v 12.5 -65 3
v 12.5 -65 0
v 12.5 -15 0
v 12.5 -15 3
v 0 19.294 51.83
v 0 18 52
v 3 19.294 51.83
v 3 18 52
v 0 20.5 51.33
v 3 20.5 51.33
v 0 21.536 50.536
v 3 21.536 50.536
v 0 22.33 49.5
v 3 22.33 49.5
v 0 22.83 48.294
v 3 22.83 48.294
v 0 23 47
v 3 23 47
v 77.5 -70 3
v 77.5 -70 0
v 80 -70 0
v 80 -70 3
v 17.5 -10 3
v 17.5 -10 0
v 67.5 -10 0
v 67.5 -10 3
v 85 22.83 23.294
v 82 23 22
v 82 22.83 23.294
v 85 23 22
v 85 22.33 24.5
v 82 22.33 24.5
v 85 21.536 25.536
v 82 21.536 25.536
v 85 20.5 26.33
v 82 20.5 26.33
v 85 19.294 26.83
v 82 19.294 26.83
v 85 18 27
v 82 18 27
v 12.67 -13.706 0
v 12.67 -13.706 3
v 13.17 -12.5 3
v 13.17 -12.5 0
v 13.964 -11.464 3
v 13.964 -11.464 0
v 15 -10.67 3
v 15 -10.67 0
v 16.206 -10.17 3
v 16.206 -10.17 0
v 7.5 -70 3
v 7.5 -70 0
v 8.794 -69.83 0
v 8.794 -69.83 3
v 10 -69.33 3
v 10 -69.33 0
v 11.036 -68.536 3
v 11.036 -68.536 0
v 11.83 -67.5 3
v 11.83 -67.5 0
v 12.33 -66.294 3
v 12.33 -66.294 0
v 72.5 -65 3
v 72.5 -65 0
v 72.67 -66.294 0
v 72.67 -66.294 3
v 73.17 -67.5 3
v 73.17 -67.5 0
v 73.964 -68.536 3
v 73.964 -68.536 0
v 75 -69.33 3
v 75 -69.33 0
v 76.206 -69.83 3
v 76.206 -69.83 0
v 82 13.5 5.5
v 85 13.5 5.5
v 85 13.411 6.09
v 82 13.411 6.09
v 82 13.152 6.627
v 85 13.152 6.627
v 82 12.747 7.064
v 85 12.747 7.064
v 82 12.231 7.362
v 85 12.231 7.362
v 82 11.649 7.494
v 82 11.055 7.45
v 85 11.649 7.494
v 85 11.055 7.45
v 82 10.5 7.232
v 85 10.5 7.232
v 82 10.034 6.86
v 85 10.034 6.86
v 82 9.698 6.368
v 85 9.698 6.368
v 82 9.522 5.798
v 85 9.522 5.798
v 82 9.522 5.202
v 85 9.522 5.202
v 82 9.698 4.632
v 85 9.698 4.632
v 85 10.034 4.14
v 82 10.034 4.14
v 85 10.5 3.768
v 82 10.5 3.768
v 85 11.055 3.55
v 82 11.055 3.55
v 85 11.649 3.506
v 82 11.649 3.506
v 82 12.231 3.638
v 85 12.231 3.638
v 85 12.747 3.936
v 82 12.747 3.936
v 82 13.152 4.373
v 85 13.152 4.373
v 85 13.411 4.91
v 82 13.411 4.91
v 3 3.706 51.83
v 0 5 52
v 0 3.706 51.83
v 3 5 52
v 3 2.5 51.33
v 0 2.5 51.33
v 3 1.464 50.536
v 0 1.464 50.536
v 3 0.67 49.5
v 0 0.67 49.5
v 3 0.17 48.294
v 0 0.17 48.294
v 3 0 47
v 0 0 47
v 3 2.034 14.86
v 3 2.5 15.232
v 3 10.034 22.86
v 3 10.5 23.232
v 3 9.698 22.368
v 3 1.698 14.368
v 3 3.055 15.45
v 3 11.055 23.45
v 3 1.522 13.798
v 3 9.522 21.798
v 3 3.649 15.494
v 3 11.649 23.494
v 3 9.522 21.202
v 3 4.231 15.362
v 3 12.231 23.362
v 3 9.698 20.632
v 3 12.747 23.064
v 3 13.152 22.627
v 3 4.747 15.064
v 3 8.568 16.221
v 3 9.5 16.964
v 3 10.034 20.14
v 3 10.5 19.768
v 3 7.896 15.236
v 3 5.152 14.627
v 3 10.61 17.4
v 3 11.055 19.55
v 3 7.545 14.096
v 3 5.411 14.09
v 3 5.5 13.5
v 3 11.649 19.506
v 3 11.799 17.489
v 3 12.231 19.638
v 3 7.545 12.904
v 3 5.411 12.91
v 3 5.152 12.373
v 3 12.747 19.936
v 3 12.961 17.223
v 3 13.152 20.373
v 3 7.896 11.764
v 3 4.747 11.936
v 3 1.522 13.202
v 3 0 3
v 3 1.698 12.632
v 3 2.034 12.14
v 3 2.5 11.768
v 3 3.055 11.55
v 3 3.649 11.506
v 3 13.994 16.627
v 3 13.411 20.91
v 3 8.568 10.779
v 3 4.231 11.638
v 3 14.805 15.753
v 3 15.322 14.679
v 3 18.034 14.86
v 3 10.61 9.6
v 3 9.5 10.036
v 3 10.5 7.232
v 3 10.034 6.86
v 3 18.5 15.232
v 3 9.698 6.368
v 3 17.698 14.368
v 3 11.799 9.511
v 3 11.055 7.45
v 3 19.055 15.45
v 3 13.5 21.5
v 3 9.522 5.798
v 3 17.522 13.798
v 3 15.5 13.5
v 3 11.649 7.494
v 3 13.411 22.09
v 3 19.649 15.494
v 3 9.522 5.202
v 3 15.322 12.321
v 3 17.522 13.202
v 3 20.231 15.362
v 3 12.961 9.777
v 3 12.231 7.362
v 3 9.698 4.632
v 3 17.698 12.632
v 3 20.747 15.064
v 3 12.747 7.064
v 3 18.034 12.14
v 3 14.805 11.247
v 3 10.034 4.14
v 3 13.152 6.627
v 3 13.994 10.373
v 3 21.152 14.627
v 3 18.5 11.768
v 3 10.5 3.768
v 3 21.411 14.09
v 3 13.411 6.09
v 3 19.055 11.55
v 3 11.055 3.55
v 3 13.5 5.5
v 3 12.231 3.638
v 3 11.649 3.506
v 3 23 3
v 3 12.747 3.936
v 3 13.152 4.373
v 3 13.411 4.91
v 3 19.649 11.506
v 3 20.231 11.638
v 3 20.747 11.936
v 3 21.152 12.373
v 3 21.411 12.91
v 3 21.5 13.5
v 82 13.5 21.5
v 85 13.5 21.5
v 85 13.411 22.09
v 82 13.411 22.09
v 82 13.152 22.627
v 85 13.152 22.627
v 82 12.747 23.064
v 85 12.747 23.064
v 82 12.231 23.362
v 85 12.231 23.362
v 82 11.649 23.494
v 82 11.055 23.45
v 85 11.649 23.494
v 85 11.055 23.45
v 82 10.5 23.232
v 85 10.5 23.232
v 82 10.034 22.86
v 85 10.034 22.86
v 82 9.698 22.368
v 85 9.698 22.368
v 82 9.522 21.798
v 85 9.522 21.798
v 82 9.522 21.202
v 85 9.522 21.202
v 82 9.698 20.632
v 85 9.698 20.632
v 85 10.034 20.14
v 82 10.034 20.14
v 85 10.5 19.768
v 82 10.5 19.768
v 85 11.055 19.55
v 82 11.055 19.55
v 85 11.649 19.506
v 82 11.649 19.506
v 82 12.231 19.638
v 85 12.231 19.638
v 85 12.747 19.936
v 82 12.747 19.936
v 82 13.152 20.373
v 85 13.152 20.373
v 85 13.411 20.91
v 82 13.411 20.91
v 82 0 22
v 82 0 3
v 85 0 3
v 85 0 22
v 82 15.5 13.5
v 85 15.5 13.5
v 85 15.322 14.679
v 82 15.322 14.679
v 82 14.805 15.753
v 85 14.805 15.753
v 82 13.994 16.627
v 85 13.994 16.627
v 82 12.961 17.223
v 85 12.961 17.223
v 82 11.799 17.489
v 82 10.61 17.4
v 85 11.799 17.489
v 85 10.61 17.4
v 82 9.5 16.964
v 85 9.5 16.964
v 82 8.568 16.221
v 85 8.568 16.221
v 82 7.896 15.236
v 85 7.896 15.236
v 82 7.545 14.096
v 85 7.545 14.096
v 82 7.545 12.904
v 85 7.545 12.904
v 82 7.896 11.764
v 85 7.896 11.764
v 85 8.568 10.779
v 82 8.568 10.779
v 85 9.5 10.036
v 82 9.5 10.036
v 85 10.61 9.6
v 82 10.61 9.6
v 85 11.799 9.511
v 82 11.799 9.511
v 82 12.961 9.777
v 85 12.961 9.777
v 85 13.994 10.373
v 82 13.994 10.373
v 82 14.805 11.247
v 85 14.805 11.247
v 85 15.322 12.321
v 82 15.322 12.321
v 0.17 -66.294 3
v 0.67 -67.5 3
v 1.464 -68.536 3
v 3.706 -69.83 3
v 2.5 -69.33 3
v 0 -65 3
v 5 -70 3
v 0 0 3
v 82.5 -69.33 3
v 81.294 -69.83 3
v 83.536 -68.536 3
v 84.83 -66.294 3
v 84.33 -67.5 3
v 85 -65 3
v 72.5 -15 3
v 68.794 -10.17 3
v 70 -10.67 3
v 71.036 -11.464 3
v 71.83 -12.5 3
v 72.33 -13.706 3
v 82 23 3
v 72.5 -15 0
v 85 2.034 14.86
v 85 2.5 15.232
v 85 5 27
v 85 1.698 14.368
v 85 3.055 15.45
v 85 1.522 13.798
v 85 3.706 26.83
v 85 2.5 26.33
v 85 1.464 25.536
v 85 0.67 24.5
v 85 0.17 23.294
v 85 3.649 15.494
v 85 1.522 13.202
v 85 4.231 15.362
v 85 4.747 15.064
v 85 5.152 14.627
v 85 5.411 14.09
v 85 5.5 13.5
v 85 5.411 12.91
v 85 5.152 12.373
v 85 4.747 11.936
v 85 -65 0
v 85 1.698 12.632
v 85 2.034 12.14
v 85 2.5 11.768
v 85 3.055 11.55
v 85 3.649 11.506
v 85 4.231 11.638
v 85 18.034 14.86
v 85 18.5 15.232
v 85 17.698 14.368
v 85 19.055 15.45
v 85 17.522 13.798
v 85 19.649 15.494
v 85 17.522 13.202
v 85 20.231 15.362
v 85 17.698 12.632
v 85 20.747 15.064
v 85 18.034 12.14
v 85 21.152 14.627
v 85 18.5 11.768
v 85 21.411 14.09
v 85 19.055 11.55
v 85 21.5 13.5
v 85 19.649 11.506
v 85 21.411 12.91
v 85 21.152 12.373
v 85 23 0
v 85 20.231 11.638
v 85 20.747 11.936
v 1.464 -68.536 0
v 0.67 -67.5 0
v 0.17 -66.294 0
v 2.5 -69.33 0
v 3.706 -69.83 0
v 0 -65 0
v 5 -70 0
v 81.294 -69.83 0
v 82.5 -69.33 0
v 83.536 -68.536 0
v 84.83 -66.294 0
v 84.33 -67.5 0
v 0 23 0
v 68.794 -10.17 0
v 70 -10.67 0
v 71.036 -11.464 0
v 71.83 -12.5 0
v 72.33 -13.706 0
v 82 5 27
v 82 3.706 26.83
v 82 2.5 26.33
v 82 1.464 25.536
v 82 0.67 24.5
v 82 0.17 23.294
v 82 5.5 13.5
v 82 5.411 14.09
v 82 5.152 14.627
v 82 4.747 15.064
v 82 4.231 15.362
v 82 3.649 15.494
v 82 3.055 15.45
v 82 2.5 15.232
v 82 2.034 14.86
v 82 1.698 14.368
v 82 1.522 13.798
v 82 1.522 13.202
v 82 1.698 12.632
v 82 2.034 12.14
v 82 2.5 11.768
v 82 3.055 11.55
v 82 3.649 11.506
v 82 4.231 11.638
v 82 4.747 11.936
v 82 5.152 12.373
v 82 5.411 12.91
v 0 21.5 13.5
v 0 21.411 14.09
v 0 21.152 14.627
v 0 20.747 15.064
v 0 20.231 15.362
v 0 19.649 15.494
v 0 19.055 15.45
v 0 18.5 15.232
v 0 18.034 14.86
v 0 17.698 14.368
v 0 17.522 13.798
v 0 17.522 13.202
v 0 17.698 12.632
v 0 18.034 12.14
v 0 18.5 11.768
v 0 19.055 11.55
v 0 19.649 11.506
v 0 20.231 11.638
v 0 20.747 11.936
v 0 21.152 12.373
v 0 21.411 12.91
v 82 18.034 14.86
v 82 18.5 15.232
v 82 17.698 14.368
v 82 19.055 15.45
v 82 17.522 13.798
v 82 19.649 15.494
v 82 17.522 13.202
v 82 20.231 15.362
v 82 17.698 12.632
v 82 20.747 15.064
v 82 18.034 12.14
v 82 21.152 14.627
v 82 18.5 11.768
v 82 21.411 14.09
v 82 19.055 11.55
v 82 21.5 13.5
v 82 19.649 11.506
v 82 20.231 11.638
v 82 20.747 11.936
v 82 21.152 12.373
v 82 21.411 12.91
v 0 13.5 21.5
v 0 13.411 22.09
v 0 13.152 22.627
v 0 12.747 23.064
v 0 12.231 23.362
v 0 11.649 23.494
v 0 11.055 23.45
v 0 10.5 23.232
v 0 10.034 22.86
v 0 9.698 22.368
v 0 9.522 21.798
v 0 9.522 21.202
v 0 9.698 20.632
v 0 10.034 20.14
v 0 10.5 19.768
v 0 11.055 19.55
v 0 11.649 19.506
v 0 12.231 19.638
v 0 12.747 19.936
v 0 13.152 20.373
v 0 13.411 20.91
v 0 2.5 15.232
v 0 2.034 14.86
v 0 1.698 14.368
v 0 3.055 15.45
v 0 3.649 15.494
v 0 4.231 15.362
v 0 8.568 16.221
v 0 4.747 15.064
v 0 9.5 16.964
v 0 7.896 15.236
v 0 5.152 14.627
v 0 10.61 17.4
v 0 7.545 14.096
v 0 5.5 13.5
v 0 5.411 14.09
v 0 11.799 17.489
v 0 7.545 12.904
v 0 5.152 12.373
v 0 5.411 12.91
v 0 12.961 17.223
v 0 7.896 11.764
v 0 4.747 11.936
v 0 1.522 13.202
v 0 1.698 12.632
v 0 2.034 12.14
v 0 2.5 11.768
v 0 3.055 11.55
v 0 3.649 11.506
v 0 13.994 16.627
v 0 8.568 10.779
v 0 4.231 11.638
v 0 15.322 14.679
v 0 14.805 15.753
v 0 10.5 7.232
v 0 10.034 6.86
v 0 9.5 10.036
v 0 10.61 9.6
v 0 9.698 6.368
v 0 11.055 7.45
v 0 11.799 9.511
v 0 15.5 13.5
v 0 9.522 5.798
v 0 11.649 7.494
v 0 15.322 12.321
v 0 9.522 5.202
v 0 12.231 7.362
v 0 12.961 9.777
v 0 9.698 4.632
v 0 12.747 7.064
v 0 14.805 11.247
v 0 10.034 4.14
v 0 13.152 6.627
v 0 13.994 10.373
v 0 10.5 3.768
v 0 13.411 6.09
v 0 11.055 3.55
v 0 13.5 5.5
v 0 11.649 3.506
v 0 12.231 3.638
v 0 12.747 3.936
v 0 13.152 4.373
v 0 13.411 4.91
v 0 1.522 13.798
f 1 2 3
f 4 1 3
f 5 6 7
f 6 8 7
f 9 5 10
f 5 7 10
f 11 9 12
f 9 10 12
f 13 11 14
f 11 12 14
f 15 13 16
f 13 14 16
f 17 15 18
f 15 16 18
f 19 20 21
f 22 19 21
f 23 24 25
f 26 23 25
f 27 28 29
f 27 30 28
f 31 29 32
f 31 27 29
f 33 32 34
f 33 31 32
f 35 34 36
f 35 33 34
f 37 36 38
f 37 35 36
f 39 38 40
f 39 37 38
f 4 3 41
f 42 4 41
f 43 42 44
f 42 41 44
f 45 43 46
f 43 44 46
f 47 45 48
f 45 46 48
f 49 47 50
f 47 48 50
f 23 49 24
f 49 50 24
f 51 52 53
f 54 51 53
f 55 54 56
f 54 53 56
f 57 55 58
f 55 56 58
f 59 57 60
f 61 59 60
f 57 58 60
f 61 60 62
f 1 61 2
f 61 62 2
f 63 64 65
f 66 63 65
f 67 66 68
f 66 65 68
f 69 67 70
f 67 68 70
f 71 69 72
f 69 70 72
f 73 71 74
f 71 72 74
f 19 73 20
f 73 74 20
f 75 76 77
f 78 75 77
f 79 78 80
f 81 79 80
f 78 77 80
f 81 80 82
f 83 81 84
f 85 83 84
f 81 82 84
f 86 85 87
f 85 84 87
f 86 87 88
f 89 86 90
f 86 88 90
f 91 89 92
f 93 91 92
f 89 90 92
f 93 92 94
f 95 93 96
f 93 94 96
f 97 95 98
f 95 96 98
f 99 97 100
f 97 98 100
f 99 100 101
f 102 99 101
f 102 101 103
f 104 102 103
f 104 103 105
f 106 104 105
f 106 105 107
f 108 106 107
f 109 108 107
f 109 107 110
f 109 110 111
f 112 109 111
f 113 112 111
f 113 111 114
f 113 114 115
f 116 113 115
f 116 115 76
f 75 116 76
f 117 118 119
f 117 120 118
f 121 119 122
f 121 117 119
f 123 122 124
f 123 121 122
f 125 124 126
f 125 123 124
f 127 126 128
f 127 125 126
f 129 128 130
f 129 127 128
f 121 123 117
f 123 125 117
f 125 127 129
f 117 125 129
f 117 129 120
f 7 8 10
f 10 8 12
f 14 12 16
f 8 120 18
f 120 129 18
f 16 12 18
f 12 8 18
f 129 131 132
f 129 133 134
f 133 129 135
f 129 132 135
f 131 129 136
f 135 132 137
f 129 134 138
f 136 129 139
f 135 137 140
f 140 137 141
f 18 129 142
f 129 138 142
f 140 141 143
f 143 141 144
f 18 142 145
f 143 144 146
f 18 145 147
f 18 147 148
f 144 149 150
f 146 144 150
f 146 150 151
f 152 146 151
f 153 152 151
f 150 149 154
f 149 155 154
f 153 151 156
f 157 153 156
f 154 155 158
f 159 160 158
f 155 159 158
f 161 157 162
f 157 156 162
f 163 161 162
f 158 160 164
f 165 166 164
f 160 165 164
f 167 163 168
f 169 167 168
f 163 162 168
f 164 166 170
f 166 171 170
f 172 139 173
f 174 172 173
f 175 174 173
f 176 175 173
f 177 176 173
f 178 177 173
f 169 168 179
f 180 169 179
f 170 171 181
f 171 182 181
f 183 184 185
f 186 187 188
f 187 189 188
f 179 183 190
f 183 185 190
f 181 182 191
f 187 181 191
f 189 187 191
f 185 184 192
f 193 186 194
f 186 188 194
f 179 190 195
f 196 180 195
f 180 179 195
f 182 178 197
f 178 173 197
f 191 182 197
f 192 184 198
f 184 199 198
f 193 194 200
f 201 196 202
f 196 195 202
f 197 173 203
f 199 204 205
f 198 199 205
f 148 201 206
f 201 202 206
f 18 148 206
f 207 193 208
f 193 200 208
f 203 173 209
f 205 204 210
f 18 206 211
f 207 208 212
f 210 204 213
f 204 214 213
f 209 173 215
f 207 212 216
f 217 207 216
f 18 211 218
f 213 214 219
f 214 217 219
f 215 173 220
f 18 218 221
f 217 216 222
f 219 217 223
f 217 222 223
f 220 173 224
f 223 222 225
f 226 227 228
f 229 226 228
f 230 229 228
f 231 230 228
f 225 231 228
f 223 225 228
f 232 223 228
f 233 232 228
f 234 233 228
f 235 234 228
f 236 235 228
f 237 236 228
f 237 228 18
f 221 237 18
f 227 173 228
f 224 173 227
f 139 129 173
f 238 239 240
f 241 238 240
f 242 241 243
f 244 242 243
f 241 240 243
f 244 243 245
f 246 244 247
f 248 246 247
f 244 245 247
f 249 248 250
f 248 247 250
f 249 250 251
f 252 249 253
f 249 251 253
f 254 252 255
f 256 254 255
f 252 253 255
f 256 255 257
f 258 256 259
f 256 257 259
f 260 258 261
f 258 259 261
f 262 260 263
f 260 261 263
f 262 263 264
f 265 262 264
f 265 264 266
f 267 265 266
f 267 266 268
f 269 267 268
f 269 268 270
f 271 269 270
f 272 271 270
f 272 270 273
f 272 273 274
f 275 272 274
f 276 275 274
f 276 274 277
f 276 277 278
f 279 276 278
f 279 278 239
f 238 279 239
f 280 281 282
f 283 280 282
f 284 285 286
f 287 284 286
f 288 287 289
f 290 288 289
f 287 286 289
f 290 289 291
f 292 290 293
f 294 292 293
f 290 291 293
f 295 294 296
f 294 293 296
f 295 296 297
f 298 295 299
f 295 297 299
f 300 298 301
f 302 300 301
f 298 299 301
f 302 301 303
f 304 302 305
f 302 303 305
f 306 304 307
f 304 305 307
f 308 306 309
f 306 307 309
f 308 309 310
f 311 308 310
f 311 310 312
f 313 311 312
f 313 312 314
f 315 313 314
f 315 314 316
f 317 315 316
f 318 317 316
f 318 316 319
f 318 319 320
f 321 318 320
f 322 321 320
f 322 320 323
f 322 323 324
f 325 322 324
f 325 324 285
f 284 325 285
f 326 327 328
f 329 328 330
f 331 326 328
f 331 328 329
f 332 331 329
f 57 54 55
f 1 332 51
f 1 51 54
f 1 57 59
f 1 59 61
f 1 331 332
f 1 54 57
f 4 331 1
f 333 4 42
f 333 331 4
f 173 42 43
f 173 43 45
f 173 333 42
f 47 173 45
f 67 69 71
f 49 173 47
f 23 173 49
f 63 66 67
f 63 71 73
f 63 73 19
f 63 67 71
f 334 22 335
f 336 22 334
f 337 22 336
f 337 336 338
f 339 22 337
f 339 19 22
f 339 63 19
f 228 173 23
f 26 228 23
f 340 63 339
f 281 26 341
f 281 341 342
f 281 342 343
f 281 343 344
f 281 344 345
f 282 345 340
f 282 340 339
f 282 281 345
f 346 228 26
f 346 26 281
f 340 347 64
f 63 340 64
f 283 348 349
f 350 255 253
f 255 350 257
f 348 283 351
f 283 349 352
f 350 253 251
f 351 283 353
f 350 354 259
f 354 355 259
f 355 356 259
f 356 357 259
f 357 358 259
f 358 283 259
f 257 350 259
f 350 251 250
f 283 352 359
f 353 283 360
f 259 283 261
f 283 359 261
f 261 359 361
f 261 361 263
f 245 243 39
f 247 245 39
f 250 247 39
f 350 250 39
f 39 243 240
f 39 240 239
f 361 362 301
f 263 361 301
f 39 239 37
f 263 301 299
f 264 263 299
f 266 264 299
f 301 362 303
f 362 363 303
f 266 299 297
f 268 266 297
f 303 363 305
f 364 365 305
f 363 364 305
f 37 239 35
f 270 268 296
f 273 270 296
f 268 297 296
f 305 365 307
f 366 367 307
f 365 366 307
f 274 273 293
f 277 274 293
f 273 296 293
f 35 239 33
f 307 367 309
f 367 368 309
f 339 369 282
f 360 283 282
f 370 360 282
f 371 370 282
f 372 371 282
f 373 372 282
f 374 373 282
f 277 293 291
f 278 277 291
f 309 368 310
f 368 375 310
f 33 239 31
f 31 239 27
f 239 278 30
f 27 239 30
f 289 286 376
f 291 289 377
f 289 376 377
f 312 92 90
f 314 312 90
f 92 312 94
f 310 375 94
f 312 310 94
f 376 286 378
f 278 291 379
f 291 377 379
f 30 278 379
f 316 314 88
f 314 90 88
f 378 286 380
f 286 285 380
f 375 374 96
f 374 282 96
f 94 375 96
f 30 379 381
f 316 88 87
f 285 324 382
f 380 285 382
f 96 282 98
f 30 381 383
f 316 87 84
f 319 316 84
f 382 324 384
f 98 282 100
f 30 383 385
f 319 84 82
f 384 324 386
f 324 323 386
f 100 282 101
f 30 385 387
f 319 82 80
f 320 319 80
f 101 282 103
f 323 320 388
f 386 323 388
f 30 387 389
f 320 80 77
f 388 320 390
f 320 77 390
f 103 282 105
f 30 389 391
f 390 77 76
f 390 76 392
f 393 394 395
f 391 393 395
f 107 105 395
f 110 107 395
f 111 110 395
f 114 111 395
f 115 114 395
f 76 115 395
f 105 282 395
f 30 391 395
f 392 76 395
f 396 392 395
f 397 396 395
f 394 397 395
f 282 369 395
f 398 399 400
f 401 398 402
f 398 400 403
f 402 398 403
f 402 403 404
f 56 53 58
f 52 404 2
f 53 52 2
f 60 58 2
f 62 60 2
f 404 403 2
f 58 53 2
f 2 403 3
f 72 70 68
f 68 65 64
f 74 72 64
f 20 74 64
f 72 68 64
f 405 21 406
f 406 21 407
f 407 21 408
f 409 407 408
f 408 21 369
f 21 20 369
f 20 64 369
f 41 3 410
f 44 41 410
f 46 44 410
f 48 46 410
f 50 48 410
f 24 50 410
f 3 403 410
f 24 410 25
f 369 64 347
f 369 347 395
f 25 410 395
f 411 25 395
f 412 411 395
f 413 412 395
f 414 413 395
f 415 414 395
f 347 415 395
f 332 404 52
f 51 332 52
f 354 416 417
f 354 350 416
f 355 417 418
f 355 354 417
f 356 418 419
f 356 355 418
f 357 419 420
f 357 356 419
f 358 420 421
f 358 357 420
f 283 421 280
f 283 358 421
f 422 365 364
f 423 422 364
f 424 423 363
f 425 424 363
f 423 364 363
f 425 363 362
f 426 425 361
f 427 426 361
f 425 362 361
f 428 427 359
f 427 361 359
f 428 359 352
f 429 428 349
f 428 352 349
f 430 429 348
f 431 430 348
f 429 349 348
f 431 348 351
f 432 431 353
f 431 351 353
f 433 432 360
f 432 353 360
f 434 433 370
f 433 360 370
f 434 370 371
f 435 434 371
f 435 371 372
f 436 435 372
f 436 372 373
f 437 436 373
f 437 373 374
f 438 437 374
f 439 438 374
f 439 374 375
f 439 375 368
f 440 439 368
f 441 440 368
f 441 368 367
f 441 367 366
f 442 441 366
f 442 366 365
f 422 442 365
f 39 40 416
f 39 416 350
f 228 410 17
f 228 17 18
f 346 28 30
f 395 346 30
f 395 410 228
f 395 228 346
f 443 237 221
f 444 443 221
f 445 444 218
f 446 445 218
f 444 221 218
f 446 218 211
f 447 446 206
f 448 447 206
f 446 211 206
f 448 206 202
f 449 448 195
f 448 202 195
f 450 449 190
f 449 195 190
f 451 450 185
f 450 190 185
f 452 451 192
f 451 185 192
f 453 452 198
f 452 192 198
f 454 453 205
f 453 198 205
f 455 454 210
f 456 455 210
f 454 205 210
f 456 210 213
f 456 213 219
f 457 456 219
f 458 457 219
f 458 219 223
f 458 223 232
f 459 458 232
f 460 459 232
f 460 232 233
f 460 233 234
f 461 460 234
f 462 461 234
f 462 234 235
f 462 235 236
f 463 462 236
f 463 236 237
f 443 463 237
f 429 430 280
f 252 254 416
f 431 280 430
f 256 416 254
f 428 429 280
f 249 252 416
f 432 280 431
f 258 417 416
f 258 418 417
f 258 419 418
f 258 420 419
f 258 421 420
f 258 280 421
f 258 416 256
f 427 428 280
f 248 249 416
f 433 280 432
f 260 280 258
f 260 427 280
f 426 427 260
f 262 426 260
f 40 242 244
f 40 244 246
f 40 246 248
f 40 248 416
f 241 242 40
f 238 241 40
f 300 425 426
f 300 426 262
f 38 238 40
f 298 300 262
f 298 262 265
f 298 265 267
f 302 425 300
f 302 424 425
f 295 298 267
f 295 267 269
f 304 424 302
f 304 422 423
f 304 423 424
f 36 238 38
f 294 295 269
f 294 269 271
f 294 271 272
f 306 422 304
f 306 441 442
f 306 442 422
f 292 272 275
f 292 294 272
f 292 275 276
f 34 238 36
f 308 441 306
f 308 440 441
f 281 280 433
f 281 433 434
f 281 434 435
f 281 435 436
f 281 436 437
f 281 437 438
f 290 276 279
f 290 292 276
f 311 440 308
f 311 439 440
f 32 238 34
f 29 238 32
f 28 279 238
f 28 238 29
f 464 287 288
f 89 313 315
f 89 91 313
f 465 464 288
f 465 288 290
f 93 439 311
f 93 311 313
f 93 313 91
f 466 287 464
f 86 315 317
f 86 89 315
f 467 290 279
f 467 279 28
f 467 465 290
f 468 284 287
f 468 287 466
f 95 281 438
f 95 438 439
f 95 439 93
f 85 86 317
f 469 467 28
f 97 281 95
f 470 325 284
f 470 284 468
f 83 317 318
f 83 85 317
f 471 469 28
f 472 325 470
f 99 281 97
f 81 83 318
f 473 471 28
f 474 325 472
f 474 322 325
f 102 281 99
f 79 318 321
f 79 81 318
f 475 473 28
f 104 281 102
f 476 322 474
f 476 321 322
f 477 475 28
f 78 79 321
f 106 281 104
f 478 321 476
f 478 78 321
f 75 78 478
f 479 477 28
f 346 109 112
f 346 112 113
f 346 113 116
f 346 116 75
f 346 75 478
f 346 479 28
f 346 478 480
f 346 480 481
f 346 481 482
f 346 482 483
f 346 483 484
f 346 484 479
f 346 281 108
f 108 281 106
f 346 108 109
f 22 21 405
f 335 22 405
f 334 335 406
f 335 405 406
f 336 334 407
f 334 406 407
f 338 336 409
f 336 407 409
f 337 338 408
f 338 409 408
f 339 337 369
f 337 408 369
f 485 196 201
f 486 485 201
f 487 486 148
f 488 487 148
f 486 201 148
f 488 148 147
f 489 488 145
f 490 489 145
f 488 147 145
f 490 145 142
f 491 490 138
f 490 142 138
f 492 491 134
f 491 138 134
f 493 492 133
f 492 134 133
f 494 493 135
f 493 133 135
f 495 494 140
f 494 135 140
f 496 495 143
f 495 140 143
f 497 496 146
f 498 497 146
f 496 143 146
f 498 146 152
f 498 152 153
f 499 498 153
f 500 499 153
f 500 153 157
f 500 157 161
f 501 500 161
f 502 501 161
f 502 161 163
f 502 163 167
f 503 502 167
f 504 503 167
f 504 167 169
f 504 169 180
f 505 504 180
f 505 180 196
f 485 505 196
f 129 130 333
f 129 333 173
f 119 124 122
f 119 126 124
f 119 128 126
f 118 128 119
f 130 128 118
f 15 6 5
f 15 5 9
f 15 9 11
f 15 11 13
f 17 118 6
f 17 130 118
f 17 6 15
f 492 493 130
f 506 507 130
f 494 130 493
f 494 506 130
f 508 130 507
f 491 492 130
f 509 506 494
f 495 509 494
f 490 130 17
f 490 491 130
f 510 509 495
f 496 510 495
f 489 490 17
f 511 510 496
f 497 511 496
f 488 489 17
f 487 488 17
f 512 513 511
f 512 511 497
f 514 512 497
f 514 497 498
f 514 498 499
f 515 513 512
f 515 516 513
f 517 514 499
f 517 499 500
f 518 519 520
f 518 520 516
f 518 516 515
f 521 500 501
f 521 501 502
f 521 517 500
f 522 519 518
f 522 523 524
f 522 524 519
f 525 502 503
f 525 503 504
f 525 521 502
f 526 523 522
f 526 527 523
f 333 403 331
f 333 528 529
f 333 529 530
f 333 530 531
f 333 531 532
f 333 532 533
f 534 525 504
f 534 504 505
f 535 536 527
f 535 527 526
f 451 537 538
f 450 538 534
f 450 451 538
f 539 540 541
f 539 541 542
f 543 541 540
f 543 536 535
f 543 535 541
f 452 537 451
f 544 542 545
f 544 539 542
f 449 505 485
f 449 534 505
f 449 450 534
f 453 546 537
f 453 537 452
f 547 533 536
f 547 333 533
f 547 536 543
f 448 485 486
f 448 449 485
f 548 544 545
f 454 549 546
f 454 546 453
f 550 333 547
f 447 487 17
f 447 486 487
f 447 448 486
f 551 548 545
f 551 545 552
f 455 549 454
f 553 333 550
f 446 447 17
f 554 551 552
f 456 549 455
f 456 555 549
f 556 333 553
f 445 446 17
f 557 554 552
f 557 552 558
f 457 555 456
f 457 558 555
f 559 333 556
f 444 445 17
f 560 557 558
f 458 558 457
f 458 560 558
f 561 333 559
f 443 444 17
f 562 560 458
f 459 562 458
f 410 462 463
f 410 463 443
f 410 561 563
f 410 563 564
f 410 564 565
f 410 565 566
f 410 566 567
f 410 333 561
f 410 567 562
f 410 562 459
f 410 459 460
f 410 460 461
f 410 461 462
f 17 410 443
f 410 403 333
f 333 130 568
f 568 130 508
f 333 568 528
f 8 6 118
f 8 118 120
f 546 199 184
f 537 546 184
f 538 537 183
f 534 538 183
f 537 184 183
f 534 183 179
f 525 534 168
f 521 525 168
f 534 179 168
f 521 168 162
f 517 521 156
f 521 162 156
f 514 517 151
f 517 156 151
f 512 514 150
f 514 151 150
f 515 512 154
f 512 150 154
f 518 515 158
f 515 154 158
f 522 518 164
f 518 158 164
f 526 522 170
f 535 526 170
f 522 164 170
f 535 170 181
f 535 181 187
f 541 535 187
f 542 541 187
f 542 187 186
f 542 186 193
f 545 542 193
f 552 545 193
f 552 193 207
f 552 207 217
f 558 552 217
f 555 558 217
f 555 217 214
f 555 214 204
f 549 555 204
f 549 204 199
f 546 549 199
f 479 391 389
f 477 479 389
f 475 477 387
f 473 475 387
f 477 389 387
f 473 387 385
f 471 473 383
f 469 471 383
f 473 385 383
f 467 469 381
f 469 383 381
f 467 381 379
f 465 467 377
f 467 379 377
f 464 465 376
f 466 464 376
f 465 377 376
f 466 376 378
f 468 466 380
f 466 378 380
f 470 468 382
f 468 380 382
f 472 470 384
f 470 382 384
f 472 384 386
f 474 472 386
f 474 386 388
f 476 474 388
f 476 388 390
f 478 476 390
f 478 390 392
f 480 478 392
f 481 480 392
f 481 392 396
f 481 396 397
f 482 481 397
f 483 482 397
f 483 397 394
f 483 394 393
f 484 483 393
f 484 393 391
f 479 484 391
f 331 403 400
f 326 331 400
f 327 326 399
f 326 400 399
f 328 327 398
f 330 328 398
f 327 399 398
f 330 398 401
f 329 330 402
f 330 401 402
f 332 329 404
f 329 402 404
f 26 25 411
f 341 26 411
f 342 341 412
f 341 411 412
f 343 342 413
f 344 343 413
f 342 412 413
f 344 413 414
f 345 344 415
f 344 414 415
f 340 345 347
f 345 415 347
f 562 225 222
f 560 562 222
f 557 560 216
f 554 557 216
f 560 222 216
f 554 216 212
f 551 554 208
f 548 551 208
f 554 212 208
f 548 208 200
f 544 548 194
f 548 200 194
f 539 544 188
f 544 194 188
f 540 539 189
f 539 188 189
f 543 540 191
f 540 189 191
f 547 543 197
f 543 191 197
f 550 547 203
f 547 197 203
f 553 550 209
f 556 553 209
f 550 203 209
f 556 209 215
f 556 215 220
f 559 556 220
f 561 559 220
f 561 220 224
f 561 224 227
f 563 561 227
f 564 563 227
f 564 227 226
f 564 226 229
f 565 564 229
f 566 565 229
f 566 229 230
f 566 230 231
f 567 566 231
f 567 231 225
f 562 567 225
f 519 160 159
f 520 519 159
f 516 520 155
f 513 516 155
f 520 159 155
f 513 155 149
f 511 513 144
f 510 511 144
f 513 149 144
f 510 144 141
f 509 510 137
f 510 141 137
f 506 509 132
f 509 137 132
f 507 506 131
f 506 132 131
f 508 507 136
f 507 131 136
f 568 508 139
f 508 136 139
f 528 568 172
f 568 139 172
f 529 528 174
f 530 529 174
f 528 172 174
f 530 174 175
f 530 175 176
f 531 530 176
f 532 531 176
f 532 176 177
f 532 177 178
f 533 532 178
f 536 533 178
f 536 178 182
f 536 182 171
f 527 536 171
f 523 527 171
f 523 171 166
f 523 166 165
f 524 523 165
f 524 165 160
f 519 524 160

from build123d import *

# Parameters (mm, degrees)
F0_W     = 85
F0_H     = 23
F1_DEPTH = 3
F2_W     = 3
F2_H     = 23
F3_DEPTH = 24
F4_W     = 3
F4_H     = 23
F5_DEPTH = 25
F6_R     = 4
F6_R_2   = 2
F7_DEPTH = 100
F8_R     = 5


with BuildPart() as f1:
    # F0 (on Top) → F1 (new body)
    with BuildSketch(Plane.XY):
        with Locations((42.5, 11.5)):
            Rectangle(F0_W, F0_H)
        with BuildLine():
            Line((85, 0), (0, 0))
            Line((0, 0), (0, -10))
            Line((0, -10), (0, -65))
            ThreePointArc((0, -65), (1.464466, -68.535534), (5, -70))
            Line((5, -70), (7.5, -70))
            ThreePointArc((7.5, -70), (11.035534, -68.535534), (12.5, -65))
            Line((12.5, -65), (12.5, -15))
            ThreePointArc((12.5, -15), (13.964466, -11.464466), (17.5, -10))
            Line((17.5, -10), (67.5, -10))
            ThreePointArc((67.5, -10), (71.035534, -11.464466), (72.5, -15))
            Line((72.5, -15), (72.5, -65))
            ThreePointArc((72.5, -65), (73.964466, -68.535534), (77.5, -70))
            Line((77.5, -70), (80, -70))
            ThreePointArc((80, -70), (83.535534, -68.535534), (85, -65))
            Line((85, -65), (85, -10))
            Line((85, -10), (85, 0))
        make_face()
    extrude(amount=F1_DEPTH)

    # F2 (on face) → F3 (join)
    with BuildSketch(Plane.XY.offset(3)):
        with Locations((1.5, 11.5)):
            Rectangle(F2_W, F2_H)
        with Locations((83.5, 11.5)):
            Rectangle(F2_W, F2_H)
    extrude(amount=F3_DEPTH)

    # F4 (on face) → F5 (join)
    with BuildSketch(Plane.XY.offset(27)):
        with Locations((1.5, 11.5)):
            Rectangle(F4_W, F4_H)
    extrude(amount=F5_DEPTH)

    # F6 (on face) → F7 (cut)
    with BuildSketch(Plane.YZ.offset(85)):
        with Locations((11.5, 13.5)):
            Circle(F6_R)
        with Locations((19.5, 13.5)):
            Circle(F6_R_2)
        with Locations((11.5, 21.5)):
            Circle(F6_R_2)
        with Locations((3.5, 13.5)):
            Circle(F6_R_2)
        with Locations((11.5, 5.5)):
            Circle(F6_R_2)
    extrude(amount=-F7_DEPTH, mode=Mode.SUBTRACT)

    # F8
    f8_edges = [f1.edges().sort_by_distance(p)[0] for p in [
        (83.5, 0, 27),
        (83.5, 23, 27),
        (1.5, 23, 52),
        (1.5, 0, 52),
    ]]
    fillet(f8_edges, radius=F8_R)


solid = f1.part
